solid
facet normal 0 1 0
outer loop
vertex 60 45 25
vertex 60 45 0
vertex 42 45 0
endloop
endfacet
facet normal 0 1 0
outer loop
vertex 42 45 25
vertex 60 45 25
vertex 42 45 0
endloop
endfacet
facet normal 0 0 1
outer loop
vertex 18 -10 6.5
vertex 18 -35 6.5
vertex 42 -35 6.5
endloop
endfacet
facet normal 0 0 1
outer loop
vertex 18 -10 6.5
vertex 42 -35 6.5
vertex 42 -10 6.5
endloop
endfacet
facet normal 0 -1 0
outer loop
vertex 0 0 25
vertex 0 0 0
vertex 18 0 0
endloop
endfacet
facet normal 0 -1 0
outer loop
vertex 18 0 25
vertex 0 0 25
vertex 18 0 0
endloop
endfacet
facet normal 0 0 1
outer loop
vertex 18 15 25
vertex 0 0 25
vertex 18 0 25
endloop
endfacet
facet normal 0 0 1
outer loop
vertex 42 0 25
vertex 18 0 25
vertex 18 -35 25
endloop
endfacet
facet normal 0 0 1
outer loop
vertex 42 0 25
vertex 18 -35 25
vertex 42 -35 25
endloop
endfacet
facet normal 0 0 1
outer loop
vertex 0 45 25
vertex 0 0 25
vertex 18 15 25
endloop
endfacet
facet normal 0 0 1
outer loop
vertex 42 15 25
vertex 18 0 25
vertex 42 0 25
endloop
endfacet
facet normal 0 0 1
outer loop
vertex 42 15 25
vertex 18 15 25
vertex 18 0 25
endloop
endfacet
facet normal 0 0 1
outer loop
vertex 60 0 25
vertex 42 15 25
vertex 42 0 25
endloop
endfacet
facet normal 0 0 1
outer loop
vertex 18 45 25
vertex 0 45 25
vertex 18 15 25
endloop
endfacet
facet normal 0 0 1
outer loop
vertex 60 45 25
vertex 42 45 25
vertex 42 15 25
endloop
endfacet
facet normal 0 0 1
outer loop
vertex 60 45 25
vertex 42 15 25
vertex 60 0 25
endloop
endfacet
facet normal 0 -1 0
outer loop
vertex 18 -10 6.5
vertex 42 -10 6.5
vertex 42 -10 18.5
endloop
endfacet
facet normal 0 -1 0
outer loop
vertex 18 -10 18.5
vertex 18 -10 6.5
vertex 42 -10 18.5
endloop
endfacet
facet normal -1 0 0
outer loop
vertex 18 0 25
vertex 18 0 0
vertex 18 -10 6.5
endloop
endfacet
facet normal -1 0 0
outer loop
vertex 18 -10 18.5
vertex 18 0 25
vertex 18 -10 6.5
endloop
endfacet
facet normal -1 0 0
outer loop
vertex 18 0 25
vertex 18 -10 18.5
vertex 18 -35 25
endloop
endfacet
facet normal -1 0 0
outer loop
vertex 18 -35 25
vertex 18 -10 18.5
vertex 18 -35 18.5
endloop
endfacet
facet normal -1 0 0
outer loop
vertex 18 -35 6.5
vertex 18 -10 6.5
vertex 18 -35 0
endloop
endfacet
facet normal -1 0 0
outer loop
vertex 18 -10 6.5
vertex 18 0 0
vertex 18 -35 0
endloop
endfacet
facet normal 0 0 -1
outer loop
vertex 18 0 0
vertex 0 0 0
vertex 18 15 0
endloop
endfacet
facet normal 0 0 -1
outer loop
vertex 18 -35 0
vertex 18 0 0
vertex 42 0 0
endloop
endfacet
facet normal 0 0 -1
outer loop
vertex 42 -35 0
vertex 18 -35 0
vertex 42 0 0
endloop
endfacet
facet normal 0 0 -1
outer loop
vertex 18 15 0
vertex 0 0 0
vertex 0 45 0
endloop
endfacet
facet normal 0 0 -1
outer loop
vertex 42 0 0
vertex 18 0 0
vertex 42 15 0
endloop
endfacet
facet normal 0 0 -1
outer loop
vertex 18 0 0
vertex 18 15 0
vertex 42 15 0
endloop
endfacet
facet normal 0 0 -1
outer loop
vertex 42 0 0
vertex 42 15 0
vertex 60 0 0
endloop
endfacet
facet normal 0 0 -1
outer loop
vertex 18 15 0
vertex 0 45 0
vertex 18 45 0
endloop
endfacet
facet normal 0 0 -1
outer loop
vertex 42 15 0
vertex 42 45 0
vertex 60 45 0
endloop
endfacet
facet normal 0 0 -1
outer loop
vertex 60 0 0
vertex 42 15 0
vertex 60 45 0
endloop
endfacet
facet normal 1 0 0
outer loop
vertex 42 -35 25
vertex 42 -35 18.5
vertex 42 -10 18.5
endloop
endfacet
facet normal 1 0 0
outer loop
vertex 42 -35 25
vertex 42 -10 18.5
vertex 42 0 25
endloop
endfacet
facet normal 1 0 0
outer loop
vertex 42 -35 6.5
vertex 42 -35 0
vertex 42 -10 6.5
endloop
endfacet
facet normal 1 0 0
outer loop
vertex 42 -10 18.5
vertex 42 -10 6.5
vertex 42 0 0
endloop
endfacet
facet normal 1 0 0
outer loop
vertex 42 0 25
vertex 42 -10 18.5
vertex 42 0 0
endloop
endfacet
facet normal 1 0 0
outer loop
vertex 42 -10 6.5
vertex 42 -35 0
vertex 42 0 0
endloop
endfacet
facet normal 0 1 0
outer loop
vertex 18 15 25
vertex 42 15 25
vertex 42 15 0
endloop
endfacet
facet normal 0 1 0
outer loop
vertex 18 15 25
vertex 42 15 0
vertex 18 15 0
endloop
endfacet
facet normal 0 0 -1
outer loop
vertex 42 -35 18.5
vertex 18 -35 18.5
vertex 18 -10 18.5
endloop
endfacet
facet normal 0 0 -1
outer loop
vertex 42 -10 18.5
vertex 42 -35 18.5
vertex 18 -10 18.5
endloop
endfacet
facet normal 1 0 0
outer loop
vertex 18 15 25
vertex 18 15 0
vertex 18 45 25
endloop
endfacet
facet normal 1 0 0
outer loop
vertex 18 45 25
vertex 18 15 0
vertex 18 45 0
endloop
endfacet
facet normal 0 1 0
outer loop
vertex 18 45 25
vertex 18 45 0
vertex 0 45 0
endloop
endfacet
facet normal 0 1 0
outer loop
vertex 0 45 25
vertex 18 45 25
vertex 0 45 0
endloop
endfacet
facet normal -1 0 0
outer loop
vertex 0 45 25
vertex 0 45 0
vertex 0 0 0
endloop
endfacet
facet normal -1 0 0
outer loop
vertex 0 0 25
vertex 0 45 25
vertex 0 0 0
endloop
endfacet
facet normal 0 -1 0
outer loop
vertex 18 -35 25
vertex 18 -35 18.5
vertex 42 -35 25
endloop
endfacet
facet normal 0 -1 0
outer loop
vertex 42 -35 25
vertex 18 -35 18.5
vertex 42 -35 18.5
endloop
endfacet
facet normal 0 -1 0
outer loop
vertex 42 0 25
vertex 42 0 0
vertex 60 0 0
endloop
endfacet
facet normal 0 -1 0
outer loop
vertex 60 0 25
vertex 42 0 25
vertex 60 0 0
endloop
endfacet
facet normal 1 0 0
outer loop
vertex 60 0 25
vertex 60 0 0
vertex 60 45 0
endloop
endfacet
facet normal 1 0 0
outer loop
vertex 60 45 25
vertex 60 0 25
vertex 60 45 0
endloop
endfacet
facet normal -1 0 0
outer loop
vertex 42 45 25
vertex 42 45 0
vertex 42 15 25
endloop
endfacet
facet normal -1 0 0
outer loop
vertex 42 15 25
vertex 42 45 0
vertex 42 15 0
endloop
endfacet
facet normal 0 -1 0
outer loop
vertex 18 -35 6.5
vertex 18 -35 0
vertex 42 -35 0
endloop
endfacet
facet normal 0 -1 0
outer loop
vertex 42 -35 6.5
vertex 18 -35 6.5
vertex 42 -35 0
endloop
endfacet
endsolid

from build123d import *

# Parameters (mm, degrees)
F1_DEPTH = 25
F2_W     = 25
F2_H     = 12
F3_DEPTH = 60.001


with BuildPart() as f1:
    # F0 (on Top) → F1 (new body)
    with BuildSketch(Plane.XY):
        Polygon((0, 45), (0, 0), (18, 0), (18, -35), (42, -35), (42, 0), (60, 0), (60, 45), (42, 45), (42, 15), (18, 15), (18, 45), align=None)
    extrude(amount=F1_DEPTH)

    # F2 (on Right) → F3 (cut, through all)
    with BuildSketch(Plane.YZ):
        with Locations((-22.5, 12.5)):
            Rectangle(F2_W, F2_H)
    extrude(amount=F3_DEPTH, mode=Mode.SUBTRACT)


solid = f1.part
